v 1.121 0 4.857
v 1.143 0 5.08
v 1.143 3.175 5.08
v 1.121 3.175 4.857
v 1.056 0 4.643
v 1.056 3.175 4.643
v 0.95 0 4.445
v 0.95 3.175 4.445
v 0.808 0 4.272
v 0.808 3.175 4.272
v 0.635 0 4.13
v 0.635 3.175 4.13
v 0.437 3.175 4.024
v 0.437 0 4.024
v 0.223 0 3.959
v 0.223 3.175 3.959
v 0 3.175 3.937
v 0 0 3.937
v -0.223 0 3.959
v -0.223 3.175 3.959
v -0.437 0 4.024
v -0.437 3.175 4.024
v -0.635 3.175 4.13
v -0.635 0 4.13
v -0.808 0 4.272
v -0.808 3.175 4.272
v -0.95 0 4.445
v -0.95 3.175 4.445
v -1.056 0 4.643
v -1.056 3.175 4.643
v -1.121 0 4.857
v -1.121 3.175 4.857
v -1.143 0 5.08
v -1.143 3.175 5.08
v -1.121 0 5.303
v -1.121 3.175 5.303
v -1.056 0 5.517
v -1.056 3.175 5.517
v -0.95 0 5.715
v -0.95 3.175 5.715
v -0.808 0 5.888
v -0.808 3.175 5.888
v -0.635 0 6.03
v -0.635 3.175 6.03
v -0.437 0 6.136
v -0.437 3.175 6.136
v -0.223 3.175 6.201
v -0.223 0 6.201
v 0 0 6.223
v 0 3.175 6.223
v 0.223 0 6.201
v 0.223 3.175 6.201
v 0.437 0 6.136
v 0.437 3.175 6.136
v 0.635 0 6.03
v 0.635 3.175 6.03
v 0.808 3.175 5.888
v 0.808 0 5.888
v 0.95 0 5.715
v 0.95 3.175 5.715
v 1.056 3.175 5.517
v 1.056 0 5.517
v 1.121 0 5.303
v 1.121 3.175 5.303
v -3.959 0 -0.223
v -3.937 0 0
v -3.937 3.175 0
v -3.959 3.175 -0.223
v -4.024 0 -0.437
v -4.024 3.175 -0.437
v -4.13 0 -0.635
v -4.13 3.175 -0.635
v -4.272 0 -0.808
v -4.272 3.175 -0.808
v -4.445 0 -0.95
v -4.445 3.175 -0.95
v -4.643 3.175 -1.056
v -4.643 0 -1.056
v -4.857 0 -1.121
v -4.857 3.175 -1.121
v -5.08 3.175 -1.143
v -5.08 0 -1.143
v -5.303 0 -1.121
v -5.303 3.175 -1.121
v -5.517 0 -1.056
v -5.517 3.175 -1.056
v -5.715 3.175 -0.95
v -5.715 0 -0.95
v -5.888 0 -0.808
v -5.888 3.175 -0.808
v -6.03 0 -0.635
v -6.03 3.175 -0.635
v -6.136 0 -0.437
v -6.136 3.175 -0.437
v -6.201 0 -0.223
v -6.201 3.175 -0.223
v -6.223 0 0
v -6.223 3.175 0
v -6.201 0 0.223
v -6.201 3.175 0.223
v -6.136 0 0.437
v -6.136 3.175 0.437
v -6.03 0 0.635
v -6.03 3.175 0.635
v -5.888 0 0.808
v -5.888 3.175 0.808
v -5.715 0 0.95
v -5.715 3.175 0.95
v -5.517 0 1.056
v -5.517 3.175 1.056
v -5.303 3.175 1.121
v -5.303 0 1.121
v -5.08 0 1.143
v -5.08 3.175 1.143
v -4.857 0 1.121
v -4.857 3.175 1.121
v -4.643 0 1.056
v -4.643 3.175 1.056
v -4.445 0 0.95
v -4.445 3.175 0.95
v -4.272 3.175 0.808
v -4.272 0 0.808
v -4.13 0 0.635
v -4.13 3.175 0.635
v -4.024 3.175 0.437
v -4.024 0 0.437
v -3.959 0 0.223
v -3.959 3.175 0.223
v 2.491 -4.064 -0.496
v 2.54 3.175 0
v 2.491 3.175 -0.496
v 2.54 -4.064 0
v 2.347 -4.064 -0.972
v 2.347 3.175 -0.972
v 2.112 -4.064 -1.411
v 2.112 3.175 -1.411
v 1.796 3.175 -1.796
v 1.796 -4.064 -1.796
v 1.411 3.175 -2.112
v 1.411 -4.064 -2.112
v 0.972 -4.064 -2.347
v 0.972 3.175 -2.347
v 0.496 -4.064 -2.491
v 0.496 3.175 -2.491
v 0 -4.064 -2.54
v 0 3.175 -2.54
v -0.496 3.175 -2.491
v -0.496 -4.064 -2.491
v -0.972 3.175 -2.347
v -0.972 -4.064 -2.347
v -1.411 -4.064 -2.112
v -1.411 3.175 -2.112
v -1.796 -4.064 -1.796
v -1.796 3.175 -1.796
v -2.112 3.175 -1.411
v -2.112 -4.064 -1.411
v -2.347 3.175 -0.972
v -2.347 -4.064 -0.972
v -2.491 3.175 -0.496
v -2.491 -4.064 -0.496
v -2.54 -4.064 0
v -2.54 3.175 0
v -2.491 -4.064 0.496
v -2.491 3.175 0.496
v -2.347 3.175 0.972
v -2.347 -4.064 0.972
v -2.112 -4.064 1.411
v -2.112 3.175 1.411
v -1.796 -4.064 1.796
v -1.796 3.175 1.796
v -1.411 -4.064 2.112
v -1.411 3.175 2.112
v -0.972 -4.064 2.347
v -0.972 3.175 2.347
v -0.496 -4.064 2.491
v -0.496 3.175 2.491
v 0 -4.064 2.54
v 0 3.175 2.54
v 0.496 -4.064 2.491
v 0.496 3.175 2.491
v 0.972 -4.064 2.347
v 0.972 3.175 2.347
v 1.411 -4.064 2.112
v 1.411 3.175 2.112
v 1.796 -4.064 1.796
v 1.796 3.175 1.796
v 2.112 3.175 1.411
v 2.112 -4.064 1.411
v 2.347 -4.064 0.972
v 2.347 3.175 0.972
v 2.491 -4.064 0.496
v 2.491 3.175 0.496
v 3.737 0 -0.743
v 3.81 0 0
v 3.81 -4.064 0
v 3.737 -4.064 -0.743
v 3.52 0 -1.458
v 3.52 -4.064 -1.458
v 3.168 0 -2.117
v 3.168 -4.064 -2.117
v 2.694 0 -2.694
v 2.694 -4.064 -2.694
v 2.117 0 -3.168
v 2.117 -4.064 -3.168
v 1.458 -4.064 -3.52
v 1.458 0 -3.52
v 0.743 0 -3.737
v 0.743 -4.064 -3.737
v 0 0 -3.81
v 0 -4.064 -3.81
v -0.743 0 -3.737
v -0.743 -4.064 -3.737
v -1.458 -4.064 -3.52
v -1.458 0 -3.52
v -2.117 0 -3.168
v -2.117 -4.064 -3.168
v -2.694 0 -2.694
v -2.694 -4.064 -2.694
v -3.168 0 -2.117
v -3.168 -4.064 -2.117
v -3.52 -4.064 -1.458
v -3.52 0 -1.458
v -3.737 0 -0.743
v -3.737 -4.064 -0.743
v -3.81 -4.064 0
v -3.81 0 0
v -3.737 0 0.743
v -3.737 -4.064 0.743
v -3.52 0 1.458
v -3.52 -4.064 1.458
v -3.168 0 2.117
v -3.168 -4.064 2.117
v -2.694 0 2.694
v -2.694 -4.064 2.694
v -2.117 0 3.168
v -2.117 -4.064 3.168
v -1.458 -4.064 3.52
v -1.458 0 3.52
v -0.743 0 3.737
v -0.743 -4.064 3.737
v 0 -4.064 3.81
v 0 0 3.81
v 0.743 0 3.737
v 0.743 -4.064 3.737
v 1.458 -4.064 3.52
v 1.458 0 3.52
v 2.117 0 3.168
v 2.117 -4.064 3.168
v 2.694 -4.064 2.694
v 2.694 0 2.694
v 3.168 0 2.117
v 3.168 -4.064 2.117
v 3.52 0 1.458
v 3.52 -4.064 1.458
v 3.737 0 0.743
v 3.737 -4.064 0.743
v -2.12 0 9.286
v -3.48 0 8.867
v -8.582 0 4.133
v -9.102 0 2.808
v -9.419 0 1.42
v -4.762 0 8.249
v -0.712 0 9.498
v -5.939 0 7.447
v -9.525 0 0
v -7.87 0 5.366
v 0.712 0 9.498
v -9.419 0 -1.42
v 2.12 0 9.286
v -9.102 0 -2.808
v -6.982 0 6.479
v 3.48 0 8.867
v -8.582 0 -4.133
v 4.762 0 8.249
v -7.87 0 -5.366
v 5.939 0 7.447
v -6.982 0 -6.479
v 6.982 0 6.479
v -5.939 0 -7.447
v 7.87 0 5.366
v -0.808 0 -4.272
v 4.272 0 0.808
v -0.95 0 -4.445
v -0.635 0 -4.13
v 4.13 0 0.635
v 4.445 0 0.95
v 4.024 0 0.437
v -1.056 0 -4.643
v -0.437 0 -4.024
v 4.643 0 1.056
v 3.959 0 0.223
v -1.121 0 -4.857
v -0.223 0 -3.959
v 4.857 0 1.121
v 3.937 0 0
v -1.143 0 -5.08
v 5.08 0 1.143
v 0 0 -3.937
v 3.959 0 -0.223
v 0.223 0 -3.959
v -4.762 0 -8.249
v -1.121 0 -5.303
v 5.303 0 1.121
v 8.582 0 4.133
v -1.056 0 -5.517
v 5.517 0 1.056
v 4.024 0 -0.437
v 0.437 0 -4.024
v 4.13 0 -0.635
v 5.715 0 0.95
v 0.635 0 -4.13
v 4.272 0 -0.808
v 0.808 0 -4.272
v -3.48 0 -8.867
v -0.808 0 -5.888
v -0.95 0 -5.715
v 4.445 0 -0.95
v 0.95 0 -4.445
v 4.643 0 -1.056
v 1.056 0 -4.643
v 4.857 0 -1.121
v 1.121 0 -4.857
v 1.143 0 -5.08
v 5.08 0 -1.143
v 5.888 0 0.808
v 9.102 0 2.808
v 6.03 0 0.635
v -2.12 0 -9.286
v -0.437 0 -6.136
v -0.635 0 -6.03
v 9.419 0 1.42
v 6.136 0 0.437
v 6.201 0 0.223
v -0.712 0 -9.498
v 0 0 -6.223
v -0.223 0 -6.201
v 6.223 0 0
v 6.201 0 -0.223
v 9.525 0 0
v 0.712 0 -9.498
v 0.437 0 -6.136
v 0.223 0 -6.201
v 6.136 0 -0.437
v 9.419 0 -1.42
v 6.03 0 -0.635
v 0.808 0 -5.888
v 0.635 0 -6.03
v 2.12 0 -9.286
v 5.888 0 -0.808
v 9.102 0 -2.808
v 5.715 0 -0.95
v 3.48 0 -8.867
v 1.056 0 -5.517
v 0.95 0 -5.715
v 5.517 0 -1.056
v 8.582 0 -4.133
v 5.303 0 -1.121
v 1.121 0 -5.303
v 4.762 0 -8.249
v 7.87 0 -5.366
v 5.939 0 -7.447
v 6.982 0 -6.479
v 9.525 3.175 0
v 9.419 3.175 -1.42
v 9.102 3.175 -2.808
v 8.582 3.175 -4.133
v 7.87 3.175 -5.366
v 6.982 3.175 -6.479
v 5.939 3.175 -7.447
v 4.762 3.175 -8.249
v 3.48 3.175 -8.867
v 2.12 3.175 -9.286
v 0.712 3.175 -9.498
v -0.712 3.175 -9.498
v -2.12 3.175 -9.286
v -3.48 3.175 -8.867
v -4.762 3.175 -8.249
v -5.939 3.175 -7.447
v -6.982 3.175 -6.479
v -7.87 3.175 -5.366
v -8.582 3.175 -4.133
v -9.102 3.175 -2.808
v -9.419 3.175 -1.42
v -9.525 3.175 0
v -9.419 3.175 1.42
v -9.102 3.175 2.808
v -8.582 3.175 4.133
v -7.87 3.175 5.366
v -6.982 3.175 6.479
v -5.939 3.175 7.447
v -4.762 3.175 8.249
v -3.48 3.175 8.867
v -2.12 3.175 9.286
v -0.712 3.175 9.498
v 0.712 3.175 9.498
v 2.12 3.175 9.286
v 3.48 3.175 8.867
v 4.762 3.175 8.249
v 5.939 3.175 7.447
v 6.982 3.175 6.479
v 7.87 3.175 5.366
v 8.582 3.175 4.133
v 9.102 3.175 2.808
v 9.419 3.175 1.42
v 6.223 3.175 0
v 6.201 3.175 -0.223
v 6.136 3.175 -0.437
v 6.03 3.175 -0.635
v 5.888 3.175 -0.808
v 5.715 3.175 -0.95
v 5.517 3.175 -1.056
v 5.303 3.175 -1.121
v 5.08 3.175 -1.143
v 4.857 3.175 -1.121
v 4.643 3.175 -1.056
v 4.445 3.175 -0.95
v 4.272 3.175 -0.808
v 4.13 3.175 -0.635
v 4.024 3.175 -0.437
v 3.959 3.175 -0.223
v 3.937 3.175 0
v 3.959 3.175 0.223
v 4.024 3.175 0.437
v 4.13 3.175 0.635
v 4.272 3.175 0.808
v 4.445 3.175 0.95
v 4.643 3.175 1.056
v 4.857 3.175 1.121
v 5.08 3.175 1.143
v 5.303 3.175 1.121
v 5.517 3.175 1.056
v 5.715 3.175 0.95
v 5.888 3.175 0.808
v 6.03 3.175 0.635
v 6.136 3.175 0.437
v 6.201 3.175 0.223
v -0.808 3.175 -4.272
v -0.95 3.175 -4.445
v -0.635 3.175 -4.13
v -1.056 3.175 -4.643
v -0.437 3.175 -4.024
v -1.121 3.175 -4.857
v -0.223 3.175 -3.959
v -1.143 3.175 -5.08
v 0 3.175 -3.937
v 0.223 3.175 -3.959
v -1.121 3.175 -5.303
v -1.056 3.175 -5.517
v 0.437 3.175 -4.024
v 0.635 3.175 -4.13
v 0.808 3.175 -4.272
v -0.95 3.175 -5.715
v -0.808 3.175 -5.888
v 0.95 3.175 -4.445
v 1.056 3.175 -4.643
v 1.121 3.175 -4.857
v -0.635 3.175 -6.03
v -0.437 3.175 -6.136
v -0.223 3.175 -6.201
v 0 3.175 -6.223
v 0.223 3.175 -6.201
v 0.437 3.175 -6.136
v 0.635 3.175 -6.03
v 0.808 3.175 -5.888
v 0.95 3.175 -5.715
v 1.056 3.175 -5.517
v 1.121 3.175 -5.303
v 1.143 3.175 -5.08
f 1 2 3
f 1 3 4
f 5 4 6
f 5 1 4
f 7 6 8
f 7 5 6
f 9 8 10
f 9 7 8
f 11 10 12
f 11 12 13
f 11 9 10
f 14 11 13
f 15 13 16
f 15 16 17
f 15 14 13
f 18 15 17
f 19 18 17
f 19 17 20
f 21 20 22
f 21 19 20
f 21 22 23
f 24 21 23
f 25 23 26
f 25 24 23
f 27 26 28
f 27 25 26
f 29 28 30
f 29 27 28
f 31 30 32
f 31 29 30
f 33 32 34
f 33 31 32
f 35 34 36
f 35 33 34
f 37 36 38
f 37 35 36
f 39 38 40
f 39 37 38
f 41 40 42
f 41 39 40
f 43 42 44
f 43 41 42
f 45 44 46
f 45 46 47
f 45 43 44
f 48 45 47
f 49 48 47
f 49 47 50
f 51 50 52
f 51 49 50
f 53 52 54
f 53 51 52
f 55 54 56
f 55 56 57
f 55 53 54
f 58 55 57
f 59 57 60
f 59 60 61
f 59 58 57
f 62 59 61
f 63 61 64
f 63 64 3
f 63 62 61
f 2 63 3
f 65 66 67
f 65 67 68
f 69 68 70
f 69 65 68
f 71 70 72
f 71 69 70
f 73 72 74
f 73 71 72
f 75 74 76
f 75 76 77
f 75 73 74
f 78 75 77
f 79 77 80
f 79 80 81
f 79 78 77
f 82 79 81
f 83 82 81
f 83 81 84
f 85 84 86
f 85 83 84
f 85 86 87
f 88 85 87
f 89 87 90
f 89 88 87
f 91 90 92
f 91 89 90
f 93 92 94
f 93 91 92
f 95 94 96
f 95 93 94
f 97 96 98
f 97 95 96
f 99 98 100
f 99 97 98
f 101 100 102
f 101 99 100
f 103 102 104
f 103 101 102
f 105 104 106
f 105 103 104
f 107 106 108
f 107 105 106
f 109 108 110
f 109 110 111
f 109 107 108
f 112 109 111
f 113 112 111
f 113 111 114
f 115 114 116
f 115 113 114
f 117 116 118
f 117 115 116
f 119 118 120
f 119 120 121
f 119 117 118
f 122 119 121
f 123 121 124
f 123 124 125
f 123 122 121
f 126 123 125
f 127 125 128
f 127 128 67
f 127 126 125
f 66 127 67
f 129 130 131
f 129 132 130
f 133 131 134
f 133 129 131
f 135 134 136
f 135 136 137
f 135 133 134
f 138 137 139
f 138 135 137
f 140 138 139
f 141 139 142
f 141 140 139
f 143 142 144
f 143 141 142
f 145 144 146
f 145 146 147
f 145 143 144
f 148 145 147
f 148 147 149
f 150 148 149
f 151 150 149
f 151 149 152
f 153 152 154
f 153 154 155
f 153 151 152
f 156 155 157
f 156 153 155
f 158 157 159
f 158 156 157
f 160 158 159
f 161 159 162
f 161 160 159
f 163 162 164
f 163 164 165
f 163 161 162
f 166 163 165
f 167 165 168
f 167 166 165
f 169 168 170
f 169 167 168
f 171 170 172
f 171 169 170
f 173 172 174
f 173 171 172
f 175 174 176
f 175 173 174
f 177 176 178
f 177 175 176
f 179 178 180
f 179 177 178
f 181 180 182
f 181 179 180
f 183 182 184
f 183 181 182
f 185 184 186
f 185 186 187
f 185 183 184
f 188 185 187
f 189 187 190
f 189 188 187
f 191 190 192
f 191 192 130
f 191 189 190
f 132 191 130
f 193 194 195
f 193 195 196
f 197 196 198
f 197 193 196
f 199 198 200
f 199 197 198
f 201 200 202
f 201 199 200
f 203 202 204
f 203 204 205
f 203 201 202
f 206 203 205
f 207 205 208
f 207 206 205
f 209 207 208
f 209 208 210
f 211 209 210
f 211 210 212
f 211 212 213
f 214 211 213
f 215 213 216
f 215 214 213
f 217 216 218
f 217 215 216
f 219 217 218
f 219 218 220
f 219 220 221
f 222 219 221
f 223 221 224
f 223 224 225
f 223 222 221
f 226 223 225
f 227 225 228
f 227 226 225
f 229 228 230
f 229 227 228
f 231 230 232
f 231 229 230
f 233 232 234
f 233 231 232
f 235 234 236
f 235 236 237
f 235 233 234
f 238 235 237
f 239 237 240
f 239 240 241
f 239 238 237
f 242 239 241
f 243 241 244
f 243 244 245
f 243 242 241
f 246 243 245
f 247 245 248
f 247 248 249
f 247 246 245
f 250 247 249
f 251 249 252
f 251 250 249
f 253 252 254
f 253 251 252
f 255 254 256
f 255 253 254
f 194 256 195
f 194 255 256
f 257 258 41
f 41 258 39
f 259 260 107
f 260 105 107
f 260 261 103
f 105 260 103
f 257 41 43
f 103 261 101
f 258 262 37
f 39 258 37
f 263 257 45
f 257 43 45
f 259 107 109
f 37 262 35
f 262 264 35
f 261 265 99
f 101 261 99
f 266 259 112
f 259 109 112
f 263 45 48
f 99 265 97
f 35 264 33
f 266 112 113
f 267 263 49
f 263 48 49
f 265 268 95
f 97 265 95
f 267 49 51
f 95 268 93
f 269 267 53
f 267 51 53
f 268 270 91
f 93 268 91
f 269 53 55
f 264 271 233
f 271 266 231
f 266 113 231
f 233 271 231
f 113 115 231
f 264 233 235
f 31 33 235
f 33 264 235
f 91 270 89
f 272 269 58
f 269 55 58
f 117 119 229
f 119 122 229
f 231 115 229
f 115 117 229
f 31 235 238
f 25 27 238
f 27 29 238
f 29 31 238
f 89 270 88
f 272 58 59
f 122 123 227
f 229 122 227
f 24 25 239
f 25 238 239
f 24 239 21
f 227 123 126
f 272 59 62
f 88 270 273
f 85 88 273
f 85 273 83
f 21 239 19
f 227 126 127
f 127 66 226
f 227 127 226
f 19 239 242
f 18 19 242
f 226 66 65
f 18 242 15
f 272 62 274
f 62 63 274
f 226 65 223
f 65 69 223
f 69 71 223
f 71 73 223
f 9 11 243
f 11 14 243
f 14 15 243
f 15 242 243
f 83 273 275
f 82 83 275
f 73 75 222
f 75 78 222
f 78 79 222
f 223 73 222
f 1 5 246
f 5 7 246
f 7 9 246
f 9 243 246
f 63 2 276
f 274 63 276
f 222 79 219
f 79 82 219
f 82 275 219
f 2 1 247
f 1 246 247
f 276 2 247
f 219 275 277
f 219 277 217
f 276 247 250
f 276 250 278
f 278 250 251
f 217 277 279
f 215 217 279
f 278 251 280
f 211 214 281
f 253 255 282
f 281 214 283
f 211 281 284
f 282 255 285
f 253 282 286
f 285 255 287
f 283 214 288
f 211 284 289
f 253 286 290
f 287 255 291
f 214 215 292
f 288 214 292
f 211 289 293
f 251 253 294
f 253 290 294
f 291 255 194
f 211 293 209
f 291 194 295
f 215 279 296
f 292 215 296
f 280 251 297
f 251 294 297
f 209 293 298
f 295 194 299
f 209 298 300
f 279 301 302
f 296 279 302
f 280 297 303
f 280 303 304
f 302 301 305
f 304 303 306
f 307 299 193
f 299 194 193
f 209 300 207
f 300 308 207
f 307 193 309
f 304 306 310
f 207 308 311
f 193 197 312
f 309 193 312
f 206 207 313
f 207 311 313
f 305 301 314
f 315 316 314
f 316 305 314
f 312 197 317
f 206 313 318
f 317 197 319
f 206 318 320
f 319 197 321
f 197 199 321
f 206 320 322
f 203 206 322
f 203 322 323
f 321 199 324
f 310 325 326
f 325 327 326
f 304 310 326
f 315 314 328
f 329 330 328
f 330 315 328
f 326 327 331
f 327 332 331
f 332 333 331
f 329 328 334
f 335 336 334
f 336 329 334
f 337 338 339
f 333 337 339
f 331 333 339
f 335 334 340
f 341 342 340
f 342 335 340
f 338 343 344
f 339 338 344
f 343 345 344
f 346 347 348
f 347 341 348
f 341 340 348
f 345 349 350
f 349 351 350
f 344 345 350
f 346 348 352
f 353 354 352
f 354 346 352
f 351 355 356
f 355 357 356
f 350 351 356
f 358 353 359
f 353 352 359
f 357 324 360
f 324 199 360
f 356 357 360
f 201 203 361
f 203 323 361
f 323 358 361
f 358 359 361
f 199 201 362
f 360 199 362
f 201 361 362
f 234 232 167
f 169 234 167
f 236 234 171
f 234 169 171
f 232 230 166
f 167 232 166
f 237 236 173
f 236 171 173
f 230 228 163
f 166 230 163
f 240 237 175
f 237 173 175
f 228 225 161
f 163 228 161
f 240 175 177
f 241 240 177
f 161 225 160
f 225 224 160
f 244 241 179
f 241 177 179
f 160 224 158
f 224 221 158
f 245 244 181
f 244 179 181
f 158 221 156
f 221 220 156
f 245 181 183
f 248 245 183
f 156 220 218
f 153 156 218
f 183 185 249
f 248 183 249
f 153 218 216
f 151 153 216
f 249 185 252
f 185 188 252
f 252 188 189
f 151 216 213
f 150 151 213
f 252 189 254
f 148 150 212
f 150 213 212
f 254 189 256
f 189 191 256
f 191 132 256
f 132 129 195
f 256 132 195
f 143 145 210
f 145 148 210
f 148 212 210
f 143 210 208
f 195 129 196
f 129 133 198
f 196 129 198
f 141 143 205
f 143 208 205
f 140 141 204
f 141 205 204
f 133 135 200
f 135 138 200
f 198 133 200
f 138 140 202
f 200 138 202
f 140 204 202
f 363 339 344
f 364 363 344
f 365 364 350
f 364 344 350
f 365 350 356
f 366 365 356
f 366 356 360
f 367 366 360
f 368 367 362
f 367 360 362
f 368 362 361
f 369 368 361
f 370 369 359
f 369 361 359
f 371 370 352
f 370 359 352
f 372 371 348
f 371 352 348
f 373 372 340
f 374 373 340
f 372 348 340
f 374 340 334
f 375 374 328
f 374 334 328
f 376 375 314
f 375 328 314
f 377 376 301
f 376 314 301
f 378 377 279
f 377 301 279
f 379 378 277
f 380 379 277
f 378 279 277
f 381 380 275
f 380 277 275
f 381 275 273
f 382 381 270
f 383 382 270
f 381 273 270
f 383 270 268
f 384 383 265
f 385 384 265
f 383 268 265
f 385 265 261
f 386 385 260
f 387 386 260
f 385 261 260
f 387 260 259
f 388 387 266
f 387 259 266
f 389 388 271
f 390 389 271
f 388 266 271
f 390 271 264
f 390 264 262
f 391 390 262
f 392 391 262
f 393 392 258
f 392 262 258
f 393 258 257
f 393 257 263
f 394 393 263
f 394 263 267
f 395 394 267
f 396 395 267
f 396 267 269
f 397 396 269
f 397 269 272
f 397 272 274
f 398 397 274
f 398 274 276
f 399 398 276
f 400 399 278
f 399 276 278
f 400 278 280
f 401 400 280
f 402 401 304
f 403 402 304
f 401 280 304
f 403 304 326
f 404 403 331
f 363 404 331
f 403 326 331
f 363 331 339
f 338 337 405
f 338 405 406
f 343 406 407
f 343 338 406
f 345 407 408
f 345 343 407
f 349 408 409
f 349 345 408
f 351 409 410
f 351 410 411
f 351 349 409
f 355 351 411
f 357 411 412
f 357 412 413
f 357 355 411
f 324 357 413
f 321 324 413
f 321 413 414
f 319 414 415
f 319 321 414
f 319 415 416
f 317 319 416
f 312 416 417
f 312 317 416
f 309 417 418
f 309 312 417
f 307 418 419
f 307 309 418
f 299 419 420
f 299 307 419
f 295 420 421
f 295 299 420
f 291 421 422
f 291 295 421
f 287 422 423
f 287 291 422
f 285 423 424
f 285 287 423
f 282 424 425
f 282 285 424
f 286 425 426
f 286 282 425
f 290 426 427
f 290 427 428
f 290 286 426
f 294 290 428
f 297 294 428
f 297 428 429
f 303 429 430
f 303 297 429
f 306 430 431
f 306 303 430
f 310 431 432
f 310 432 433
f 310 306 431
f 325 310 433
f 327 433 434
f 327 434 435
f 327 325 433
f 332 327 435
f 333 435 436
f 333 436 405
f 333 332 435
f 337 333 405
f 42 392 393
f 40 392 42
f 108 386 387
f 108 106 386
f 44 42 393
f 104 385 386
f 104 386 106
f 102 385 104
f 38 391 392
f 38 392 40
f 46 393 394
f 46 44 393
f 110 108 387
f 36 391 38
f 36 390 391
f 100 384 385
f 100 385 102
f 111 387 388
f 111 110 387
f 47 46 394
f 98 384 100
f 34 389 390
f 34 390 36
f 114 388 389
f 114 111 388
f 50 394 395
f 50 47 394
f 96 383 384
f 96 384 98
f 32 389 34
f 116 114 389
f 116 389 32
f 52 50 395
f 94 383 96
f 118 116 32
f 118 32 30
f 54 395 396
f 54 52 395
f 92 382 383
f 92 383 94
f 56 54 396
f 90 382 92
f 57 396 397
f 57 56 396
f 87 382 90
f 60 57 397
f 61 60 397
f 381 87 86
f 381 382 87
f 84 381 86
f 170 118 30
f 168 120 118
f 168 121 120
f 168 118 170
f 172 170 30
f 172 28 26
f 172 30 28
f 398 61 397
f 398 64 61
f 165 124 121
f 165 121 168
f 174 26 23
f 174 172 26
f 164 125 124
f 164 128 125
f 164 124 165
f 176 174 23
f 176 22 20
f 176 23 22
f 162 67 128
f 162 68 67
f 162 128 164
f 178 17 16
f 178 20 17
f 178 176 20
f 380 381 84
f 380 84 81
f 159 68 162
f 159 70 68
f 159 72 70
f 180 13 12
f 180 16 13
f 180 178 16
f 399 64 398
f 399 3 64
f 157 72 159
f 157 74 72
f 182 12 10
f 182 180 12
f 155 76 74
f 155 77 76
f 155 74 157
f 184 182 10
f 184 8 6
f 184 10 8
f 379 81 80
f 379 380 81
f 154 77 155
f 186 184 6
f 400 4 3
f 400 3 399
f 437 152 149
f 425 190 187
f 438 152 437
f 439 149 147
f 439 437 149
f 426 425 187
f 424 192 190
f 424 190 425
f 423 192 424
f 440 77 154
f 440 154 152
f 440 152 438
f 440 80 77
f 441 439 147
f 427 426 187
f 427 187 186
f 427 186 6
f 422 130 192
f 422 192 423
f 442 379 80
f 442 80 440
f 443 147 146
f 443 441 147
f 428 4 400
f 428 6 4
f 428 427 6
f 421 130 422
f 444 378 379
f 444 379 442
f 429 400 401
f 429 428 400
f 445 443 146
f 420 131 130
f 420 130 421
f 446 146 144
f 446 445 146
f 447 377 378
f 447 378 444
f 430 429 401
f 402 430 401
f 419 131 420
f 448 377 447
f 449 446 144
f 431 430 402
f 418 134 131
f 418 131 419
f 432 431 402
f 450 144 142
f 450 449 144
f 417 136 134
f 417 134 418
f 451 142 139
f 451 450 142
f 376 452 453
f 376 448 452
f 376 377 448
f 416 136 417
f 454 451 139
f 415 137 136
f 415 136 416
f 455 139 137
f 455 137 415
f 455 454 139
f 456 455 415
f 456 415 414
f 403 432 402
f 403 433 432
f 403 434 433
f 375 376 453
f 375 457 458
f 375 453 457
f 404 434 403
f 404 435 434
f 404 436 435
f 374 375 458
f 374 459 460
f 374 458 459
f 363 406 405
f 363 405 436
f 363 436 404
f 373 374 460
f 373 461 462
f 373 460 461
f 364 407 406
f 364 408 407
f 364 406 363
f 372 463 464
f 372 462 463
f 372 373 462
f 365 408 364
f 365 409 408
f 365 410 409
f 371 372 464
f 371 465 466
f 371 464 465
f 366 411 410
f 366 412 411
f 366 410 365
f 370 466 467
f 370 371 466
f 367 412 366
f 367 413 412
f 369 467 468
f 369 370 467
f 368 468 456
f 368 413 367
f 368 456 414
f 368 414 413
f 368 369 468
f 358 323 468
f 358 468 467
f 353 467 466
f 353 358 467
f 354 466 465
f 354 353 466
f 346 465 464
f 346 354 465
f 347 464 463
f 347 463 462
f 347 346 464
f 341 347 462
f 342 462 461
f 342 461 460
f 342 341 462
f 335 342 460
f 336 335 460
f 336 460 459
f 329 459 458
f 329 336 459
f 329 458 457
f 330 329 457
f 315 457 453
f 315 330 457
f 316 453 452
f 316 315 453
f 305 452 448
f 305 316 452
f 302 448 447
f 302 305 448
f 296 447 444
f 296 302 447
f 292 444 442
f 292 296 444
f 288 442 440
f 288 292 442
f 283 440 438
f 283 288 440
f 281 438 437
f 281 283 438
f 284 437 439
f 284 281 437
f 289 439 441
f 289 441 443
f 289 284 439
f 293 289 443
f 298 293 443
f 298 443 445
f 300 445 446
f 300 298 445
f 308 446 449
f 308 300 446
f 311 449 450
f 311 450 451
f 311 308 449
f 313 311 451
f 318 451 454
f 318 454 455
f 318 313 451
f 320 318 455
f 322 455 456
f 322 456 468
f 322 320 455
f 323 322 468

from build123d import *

# Parameters (mm, degrees)
SKETCH1_R           = 9.525
BOSS_EXTRUDE1_DEPTH = 3.175
SKETCH2_R           = 3.81
SKETCH2_R_2         = 2.54
BOSS_EXTRUDE2_DEPTH = 4.064
SKETCH3_R           = 2.54
SKETCH3_R_2         = 1.143
CUT_EXTRUDE1_DEPTH  = 3.175


with BuildPart() as part:
    # Sketch1 → Boss-Extrude1 (new body)
    with BuildSketch(Plane(origin=(0, 0, 0), x_dir=(1, 0, 0), z_dir=(0, 1, 0))):
        Circle(SKETCH1_R)
    extrude(amount=BOSS_EXTRUDE1_DEPTH)

    # Sketch2 → Boss-Extrude2 (add)
    with BuildSketch(Plane(origin=(0, 0, 0), x_dir=(1, 0, 0), z_dir=(0, 1, 0))):
        Circle(SKETCH2_R)
        Circle(SKETCH2_R_2, mode=Mode.SUBTRACT)
    extrude(amount=-BOSS_EXTRUDE2_DEPTH)

    # Sketch3 → Cut-Extrude1 (cut)
    with BuildSketch(Plane(origin=(0, 0, 0), x_dir=(1, 0, 0), z_dir=(0, 1, 0))):
        Circle(SKETCH3_R)
        with Locations((5.08, 0)):
            Circle(SKETCH3_R_2)
        with Locations((0, 5.08)):
            Circle(SKETCH3_R_2)
        with Locations((-5.08, 0)):
            Circle(SKETCH3_R_2)
        with Locations((0, -5.08)):
            Circle(SKETCH3_R_2)
    extrude(amount=CUT_EXTRUDE1_DEPTH, mode=Mode.SUBTRACT)


solid = part.part
